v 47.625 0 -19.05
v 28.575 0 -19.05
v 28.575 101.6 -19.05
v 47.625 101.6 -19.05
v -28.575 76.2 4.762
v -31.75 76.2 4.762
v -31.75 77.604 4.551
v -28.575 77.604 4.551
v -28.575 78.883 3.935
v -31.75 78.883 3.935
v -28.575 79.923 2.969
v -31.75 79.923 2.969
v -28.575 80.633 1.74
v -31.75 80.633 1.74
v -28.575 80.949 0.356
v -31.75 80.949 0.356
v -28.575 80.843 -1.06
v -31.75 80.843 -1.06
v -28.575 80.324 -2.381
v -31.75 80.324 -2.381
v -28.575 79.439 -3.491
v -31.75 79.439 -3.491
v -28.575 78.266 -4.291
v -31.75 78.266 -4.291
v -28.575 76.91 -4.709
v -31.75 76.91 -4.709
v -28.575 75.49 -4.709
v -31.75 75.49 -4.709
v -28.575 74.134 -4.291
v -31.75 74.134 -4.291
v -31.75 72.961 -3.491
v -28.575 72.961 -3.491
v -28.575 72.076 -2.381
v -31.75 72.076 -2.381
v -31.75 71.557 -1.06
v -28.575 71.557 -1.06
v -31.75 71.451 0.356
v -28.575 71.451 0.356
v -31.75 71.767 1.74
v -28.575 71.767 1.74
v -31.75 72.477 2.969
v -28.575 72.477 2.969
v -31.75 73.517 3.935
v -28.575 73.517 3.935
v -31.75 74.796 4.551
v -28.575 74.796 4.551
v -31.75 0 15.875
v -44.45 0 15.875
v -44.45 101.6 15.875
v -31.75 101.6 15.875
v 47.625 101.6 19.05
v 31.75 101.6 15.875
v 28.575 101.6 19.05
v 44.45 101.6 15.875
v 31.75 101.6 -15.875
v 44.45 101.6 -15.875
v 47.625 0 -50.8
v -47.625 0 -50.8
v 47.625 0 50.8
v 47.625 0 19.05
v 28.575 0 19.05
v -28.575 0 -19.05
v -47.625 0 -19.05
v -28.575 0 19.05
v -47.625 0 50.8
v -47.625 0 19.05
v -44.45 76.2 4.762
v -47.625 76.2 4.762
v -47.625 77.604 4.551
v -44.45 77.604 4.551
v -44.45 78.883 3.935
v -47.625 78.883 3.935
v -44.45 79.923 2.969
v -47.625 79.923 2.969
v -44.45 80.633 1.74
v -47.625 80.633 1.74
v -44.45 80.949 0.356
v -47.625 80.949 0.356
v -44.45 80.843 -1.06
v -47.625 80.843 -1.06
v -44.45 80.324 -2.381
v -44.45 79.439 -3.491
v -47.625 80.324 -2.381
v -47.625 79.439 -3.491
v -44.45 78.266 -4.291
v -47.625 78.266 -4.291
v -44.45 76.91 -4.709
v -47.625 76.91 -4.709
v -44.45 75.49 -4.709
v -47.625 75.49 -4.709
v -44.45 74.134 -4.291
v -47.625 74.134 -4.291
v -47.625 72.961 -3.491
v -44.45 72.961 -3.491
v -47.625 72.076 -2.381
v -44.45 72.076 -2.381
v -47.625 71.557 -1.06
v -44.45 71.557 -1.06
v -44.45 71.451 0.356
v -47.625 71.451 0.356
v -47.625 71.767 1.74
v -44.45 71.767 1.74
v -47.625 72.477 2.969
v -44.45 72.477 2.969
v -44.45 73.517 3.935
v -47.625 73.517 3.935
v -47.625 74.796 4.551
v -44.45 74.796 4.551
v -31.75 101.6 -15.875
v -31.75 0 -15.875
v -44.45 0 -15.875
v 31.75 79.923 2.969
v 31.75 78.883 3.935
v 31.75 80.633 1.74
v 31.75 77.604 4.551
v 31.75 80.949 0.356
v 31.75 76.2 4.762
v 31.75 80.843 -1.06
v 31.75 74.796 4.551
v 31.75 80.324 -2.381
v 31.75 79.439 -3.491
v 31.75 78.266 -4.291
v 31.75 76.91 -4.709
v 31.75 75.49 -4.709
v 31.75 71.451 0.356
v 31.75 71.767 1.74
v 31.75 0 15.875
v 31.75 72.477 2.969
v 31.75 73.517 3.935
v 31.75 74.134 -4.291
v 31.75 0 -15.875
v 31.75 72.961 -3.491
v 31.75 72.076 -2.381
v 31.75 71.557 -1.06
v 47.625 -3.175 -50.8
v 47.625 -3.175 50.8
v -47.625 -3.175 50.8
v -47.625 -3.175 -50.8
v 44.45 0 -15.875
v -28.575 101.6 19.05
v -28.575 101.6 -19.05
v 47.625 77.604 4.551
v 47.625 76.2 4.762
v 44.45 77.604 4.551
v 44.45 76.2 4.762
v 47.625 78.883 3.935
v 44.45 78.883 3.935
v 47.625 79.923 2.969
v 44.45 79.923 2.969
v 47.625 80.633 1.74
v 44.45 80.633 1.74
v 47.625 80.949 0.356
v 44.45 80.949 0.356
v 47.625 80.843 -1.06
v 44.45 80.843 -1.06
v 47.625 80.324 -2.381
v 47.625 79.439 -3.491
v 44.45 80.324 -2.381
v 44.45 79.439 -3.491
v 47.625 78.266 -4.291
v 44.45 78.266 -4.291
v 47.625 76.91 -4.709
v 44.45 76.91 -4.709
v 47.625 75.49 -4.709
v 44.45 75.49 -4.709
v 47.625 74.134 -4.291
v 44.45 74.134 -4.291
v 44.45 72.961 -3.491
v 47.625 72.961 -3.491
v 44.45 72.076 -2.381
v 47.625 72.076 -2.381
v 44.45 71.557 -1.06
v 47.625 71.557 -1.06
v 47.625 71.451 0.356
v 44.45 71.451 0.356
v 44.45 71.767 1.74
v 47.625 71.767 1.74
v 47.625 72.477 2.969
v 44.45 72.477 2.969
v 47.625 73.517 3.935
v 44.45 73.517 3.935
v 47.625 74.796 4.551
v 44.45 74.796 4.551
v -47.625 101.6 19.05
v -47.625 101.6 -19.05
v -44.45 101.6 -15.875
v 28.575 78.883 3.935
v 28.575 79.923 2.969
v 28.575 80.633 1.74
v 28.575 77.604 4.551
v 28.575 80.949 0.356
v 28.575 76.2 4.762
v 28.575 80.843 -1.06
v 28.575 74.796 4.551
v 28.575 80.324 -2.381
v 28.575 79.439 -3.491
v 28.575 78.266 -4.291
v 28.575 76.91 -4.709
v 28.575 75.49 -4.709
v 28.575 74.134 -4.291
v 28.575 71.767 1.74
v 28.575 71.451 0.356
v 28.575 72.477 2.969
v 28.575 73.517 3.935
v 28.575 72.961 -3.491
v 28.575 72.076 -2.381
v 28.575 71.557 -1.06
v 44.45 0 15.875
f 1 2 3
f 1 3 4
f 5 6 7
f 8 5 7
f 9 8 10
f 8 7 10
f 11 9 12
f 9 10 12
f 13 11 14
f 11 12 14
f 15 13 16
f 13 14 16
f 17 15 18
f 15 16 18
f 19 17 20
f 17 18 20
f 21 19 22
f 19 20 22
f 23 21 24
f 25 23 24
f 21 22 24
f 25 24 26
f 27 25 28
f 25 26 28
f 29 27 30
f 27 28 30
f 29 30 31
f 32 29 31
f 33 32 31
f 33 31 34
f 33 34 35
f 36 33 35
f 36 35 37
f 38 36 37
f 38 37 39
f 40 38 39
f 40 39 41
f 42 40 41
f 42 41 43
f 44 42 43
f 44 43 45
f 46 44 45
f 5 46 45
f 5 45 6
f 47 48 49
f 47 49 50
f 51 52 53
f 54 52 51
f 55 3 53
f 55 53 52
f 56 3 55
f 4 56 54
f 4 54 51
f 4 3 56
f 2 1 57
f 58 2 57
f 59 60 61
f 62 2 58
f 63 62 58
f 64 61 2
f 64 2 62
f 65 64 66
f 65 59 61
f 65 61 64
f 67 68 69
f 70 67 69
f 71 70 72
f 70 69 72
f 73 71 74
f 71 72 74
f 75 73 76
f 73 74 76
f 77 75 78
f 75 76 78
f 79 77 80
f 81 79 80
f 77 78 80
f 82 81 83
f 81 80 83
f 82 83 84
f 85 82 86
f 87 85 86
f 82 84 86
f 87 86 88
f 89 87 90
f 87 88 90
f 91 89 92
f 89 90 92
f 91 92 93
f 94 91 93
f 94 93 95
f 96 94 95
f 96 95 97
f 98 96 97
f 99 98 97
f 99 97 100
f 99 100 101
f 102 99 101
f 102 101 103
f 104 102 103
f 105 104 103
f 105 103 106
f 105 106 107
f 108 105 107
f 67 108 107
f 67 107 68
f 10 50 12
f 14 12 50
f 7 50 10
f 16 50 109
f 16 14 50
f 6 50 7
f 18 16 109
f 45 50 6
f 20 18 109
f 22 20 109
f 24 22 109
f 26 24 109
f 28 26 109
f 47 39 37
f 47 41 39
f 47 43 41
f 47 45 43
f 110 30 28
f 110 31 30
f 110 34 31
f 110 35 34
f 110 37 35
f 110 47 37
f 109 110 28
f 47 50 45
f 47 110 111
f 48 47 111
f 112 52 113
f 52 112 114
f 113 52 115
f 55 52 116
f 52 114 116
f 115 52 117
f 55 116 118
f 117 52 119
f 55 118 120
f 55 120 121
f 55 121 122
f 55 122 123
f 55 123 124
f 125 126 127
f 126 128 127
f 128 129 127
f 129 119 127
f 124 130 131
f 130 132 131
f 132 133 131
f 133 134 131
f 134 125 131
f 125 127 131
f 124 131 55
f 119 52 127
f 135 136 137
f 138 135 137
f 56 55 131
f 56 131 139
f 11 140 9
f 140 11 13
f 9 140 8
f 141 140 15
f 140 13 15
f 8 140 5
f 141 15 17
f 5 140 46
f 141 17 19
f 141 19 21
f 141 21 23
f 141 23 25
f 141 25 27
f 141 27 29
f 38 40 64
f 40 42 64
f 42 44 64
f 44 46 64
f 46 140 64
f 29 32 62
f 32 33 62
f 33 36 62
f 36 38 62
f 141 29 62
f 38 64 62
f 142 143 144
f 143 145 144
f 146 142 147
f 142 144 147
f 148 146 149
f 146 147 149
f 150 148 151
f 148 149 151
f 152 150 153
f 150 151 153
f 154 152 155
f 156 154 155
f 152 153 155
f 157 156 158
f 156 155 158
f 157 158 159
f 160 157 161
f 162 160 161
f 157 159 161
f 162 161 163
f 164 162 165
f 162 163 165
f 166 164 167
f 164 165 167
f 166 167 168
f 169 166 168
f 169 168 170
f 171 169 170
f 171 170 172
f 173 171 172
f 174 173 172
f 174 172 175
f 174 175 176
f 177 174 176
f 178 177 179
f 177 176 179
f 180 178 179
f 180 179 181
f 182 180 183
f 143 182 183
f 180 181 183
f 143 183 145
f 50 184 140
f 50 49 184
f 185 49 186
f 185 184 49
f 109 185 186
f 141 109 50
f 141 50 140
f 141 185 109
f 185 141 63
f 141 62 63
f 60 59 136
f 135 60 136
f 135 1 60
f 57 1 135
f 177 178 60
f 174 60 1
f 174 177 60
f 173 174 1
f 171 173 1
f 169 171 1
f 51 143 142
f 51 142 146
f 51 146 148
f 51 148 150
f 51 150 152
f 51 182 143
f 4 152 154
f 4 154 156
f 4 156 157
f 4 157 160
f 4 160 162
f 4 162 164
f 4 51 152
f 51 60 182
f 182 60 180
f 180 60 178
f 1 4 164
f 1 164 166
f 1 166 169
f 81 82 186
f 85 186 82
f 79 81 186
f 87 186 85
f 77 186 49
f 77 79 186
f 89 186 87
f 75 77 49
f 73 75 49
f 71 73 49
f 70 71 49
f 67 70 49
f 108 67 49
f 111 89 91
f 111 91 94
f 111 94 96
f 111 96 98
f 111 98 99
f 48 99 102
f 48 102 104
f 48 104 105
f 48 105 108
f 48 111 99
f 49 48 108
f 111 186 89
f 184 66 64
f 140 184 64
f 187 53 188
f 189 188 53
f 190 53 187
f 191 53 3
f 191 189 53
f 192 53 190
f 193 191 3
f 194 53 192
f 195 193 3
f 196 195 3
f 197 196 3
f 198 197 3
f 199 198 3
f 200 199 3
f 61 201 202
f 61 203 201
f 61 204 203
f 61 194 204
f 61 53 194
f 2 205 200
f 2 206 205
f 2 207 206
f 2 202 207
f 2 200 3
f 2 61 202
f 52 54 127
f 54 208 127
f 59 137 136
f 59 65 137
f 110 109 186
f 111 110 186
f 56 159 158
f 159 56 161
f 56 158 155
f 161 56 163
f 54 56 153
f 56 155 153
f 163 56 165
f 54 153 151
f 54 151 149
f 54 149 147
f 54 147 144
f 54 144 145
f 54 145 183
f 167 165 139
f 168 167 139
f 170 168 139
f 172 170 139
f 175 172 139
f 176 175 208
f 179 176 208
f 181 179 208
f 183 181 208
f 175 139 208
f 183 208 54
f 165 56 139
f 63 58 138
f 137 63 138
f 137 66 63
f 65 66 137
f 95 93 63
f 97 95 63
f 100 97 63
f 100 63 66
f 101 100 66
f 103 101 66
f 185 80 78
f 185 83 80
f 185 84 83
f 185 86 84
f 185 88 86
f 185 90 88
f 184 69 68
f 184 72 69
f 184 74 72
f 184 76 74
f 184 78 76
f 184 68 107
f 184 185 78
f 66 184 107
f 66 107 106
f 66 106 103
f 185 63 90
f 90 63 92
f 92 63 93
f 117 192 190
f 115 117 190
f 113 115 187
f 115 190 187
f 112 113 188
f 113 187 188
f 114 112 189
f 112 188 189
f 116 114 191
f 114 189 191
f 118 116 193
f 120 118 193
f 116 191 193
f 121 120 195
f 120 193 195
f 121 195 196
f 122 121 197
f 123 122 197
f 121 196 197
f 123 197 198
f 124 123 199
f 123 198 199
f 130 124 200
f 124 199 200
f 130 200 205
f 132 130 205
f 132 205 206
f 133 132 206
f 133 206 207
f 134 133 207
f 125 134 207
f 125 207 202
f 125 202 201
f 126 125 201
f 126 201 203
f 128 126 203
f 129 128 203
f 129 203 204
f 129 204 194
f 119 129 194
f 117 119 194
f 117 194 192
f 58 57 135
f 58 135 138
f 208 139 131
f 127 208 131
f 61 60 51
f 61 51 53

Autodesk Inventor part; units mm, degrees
ref_plane "XZ Plane" through (0, 0, 0) normal (0, 1, 0) x (-1, 0, 0)
ref_plane "XY Plane" through (0, 0, 0) normal (0, 0, 1) x (1, 0, 0)
sketch "Sketch1" plane through (0, 0, 0) normal (0, 1, 0) x (-1, 0, 0)
  line L0 (47.625, 50.8) -> (-47.625, 50.8)
  line L1 (-47.625, 50.8) -> (-47.625, -50.8)
  line L2 (-47.625, -50.8) -> (47.625, -50.8)
  line L3 (47.625, -50.8) -> (47.625, 50.8)
  line L4 (47.625, 50.8) -> (-47.625, -50.8) construction
  line L5 (-47.625, 50.8) -> (47.625, -50.8) construction
  point P0 (0, 0)
  dimension "d0" = 95.25
  dimension "d1" = 101.6
extrude "Extrusion1" add sketch "Sketch1" against normal blind 3.175
sketch "Sketch2" plane through (0, 0, 0) normal (0, 1, 0) x (1, 0, 0)
  line L0 (-47.625, -19.05) -> (-28.575, -19.05)
  line L1 (-28.575, -19.05) -> (-28.575, 19.05)
  line L2 (-28.575, 19.05) -> (-47.625, 19.05)
  line L3 (-47.625, 19.05) -> (-47.625, -19.05)
  line L4 (-47.625, -19.05) -> (-28.575, 19.05) construction
  line L5 (-28.575, -19.05) -> (-47.625, 19.05) construction
  line L6 (-44.45, -15.875) -> (-31.75, -15.875)
  line L7 (-31.75, -15.875) -> (-31.75, 15.875)
  line L8 (-31.75, 15.875) -> (-44.45, 15.875)
  line L9 (-44.45, 15.875) -> (-44.45, -15.875)
  line L10 (-44.45, -15.875) -> (-31.75, 15.875) construction
  line L11 (-31.75, -15.875) -> (-44.45, 15.875) construction
  line L12 (-47.625, 50.8) -> (47.625, 50.8) construction
  line L13 (0, 50.8) -> (0, -101.6) construction
  line L14 (47.625, -19.05) -> (28.575, -19.05)
  line L15 (28.575, -19.05) -> (28.575, 19.05)
  line L16 (28.575, 19.05) -> (47.625, 19.05)
  line L17 (47.625, 19.05) -> (47.625, -19.05)
  line L18 (44.45, -15.875) -> (31.75, -15.875)
  line L19 (31.75, -15.875) -> (31.75, 15.875)
  line L20 (31.75, 15.875) -> (44.45, 15.875)
  line L21 (44.45, 15.875) -> (44.45, -15.875)
  point P0 (0, 0)
  point P1 (-38.1, 0)
  dimension "d4" = 38.1
  dimension "d5" = 19.05
  dimension "d6" = 38.1
  dimension "d7" = 3.175
  dimension "d8" = 3.175
extrude "Extrusion2" add sketch "Sketch2" along normal blind 101.6
sketch "Sketch4" plane through (-47.625, -3.175, -50.8) normal (-1, 0, 0) x (0, 0, 1)
  line L0 (50.8, 3.175) -> (50.8, 93.283) construction
  circle A0 centre (50.8, 79.375) radius 4.7625
  line L1 (0, 3.175) -> (31.75, 3.175) projected
  dimension "d15" = 9.525
  dimension "d16" = 76.2
extrude "Extrusion4" cut sketch "Sketch4" against normal through all
equation "\"d0\" = BaseWidth"
equation "\"d1\" = BaseLength"
equation "\"d2\" = BaseThickness"
equation "\"d4\" = postCenterDistanceFromCenterOfBase"
equation "\"d5\" = postWidth"
equation "\"d6\" = postLength"
equation "\"d7\" = postThickness"
equation "\"d8\" = postThickness"
equation "\"d9\" = postHeight"
equation "\"d15\" = axelDiam"
equation "\"d16\" = axelHeightAbovePlate"
equation "\"BaseWidth\" = 95.25"
equation "\"BaseLength\" = 101.6"
equation "\"BaseThickness\" = 3.175"
equation "\"postWidth\" = 19.05"
equation "\"postLength\" = 38.1"
equation "\"postThickness\" = 3.175"
equation "\"postCenterDistanceFromCenterOfBase\" = 38.1"
equation "\"axelDiam\" = 9.525"
equation "\"axelHeightAbovePlate\" = 76.2"
equation "\"postHeight\" = 101.6"
properties part number "PostForLift"
